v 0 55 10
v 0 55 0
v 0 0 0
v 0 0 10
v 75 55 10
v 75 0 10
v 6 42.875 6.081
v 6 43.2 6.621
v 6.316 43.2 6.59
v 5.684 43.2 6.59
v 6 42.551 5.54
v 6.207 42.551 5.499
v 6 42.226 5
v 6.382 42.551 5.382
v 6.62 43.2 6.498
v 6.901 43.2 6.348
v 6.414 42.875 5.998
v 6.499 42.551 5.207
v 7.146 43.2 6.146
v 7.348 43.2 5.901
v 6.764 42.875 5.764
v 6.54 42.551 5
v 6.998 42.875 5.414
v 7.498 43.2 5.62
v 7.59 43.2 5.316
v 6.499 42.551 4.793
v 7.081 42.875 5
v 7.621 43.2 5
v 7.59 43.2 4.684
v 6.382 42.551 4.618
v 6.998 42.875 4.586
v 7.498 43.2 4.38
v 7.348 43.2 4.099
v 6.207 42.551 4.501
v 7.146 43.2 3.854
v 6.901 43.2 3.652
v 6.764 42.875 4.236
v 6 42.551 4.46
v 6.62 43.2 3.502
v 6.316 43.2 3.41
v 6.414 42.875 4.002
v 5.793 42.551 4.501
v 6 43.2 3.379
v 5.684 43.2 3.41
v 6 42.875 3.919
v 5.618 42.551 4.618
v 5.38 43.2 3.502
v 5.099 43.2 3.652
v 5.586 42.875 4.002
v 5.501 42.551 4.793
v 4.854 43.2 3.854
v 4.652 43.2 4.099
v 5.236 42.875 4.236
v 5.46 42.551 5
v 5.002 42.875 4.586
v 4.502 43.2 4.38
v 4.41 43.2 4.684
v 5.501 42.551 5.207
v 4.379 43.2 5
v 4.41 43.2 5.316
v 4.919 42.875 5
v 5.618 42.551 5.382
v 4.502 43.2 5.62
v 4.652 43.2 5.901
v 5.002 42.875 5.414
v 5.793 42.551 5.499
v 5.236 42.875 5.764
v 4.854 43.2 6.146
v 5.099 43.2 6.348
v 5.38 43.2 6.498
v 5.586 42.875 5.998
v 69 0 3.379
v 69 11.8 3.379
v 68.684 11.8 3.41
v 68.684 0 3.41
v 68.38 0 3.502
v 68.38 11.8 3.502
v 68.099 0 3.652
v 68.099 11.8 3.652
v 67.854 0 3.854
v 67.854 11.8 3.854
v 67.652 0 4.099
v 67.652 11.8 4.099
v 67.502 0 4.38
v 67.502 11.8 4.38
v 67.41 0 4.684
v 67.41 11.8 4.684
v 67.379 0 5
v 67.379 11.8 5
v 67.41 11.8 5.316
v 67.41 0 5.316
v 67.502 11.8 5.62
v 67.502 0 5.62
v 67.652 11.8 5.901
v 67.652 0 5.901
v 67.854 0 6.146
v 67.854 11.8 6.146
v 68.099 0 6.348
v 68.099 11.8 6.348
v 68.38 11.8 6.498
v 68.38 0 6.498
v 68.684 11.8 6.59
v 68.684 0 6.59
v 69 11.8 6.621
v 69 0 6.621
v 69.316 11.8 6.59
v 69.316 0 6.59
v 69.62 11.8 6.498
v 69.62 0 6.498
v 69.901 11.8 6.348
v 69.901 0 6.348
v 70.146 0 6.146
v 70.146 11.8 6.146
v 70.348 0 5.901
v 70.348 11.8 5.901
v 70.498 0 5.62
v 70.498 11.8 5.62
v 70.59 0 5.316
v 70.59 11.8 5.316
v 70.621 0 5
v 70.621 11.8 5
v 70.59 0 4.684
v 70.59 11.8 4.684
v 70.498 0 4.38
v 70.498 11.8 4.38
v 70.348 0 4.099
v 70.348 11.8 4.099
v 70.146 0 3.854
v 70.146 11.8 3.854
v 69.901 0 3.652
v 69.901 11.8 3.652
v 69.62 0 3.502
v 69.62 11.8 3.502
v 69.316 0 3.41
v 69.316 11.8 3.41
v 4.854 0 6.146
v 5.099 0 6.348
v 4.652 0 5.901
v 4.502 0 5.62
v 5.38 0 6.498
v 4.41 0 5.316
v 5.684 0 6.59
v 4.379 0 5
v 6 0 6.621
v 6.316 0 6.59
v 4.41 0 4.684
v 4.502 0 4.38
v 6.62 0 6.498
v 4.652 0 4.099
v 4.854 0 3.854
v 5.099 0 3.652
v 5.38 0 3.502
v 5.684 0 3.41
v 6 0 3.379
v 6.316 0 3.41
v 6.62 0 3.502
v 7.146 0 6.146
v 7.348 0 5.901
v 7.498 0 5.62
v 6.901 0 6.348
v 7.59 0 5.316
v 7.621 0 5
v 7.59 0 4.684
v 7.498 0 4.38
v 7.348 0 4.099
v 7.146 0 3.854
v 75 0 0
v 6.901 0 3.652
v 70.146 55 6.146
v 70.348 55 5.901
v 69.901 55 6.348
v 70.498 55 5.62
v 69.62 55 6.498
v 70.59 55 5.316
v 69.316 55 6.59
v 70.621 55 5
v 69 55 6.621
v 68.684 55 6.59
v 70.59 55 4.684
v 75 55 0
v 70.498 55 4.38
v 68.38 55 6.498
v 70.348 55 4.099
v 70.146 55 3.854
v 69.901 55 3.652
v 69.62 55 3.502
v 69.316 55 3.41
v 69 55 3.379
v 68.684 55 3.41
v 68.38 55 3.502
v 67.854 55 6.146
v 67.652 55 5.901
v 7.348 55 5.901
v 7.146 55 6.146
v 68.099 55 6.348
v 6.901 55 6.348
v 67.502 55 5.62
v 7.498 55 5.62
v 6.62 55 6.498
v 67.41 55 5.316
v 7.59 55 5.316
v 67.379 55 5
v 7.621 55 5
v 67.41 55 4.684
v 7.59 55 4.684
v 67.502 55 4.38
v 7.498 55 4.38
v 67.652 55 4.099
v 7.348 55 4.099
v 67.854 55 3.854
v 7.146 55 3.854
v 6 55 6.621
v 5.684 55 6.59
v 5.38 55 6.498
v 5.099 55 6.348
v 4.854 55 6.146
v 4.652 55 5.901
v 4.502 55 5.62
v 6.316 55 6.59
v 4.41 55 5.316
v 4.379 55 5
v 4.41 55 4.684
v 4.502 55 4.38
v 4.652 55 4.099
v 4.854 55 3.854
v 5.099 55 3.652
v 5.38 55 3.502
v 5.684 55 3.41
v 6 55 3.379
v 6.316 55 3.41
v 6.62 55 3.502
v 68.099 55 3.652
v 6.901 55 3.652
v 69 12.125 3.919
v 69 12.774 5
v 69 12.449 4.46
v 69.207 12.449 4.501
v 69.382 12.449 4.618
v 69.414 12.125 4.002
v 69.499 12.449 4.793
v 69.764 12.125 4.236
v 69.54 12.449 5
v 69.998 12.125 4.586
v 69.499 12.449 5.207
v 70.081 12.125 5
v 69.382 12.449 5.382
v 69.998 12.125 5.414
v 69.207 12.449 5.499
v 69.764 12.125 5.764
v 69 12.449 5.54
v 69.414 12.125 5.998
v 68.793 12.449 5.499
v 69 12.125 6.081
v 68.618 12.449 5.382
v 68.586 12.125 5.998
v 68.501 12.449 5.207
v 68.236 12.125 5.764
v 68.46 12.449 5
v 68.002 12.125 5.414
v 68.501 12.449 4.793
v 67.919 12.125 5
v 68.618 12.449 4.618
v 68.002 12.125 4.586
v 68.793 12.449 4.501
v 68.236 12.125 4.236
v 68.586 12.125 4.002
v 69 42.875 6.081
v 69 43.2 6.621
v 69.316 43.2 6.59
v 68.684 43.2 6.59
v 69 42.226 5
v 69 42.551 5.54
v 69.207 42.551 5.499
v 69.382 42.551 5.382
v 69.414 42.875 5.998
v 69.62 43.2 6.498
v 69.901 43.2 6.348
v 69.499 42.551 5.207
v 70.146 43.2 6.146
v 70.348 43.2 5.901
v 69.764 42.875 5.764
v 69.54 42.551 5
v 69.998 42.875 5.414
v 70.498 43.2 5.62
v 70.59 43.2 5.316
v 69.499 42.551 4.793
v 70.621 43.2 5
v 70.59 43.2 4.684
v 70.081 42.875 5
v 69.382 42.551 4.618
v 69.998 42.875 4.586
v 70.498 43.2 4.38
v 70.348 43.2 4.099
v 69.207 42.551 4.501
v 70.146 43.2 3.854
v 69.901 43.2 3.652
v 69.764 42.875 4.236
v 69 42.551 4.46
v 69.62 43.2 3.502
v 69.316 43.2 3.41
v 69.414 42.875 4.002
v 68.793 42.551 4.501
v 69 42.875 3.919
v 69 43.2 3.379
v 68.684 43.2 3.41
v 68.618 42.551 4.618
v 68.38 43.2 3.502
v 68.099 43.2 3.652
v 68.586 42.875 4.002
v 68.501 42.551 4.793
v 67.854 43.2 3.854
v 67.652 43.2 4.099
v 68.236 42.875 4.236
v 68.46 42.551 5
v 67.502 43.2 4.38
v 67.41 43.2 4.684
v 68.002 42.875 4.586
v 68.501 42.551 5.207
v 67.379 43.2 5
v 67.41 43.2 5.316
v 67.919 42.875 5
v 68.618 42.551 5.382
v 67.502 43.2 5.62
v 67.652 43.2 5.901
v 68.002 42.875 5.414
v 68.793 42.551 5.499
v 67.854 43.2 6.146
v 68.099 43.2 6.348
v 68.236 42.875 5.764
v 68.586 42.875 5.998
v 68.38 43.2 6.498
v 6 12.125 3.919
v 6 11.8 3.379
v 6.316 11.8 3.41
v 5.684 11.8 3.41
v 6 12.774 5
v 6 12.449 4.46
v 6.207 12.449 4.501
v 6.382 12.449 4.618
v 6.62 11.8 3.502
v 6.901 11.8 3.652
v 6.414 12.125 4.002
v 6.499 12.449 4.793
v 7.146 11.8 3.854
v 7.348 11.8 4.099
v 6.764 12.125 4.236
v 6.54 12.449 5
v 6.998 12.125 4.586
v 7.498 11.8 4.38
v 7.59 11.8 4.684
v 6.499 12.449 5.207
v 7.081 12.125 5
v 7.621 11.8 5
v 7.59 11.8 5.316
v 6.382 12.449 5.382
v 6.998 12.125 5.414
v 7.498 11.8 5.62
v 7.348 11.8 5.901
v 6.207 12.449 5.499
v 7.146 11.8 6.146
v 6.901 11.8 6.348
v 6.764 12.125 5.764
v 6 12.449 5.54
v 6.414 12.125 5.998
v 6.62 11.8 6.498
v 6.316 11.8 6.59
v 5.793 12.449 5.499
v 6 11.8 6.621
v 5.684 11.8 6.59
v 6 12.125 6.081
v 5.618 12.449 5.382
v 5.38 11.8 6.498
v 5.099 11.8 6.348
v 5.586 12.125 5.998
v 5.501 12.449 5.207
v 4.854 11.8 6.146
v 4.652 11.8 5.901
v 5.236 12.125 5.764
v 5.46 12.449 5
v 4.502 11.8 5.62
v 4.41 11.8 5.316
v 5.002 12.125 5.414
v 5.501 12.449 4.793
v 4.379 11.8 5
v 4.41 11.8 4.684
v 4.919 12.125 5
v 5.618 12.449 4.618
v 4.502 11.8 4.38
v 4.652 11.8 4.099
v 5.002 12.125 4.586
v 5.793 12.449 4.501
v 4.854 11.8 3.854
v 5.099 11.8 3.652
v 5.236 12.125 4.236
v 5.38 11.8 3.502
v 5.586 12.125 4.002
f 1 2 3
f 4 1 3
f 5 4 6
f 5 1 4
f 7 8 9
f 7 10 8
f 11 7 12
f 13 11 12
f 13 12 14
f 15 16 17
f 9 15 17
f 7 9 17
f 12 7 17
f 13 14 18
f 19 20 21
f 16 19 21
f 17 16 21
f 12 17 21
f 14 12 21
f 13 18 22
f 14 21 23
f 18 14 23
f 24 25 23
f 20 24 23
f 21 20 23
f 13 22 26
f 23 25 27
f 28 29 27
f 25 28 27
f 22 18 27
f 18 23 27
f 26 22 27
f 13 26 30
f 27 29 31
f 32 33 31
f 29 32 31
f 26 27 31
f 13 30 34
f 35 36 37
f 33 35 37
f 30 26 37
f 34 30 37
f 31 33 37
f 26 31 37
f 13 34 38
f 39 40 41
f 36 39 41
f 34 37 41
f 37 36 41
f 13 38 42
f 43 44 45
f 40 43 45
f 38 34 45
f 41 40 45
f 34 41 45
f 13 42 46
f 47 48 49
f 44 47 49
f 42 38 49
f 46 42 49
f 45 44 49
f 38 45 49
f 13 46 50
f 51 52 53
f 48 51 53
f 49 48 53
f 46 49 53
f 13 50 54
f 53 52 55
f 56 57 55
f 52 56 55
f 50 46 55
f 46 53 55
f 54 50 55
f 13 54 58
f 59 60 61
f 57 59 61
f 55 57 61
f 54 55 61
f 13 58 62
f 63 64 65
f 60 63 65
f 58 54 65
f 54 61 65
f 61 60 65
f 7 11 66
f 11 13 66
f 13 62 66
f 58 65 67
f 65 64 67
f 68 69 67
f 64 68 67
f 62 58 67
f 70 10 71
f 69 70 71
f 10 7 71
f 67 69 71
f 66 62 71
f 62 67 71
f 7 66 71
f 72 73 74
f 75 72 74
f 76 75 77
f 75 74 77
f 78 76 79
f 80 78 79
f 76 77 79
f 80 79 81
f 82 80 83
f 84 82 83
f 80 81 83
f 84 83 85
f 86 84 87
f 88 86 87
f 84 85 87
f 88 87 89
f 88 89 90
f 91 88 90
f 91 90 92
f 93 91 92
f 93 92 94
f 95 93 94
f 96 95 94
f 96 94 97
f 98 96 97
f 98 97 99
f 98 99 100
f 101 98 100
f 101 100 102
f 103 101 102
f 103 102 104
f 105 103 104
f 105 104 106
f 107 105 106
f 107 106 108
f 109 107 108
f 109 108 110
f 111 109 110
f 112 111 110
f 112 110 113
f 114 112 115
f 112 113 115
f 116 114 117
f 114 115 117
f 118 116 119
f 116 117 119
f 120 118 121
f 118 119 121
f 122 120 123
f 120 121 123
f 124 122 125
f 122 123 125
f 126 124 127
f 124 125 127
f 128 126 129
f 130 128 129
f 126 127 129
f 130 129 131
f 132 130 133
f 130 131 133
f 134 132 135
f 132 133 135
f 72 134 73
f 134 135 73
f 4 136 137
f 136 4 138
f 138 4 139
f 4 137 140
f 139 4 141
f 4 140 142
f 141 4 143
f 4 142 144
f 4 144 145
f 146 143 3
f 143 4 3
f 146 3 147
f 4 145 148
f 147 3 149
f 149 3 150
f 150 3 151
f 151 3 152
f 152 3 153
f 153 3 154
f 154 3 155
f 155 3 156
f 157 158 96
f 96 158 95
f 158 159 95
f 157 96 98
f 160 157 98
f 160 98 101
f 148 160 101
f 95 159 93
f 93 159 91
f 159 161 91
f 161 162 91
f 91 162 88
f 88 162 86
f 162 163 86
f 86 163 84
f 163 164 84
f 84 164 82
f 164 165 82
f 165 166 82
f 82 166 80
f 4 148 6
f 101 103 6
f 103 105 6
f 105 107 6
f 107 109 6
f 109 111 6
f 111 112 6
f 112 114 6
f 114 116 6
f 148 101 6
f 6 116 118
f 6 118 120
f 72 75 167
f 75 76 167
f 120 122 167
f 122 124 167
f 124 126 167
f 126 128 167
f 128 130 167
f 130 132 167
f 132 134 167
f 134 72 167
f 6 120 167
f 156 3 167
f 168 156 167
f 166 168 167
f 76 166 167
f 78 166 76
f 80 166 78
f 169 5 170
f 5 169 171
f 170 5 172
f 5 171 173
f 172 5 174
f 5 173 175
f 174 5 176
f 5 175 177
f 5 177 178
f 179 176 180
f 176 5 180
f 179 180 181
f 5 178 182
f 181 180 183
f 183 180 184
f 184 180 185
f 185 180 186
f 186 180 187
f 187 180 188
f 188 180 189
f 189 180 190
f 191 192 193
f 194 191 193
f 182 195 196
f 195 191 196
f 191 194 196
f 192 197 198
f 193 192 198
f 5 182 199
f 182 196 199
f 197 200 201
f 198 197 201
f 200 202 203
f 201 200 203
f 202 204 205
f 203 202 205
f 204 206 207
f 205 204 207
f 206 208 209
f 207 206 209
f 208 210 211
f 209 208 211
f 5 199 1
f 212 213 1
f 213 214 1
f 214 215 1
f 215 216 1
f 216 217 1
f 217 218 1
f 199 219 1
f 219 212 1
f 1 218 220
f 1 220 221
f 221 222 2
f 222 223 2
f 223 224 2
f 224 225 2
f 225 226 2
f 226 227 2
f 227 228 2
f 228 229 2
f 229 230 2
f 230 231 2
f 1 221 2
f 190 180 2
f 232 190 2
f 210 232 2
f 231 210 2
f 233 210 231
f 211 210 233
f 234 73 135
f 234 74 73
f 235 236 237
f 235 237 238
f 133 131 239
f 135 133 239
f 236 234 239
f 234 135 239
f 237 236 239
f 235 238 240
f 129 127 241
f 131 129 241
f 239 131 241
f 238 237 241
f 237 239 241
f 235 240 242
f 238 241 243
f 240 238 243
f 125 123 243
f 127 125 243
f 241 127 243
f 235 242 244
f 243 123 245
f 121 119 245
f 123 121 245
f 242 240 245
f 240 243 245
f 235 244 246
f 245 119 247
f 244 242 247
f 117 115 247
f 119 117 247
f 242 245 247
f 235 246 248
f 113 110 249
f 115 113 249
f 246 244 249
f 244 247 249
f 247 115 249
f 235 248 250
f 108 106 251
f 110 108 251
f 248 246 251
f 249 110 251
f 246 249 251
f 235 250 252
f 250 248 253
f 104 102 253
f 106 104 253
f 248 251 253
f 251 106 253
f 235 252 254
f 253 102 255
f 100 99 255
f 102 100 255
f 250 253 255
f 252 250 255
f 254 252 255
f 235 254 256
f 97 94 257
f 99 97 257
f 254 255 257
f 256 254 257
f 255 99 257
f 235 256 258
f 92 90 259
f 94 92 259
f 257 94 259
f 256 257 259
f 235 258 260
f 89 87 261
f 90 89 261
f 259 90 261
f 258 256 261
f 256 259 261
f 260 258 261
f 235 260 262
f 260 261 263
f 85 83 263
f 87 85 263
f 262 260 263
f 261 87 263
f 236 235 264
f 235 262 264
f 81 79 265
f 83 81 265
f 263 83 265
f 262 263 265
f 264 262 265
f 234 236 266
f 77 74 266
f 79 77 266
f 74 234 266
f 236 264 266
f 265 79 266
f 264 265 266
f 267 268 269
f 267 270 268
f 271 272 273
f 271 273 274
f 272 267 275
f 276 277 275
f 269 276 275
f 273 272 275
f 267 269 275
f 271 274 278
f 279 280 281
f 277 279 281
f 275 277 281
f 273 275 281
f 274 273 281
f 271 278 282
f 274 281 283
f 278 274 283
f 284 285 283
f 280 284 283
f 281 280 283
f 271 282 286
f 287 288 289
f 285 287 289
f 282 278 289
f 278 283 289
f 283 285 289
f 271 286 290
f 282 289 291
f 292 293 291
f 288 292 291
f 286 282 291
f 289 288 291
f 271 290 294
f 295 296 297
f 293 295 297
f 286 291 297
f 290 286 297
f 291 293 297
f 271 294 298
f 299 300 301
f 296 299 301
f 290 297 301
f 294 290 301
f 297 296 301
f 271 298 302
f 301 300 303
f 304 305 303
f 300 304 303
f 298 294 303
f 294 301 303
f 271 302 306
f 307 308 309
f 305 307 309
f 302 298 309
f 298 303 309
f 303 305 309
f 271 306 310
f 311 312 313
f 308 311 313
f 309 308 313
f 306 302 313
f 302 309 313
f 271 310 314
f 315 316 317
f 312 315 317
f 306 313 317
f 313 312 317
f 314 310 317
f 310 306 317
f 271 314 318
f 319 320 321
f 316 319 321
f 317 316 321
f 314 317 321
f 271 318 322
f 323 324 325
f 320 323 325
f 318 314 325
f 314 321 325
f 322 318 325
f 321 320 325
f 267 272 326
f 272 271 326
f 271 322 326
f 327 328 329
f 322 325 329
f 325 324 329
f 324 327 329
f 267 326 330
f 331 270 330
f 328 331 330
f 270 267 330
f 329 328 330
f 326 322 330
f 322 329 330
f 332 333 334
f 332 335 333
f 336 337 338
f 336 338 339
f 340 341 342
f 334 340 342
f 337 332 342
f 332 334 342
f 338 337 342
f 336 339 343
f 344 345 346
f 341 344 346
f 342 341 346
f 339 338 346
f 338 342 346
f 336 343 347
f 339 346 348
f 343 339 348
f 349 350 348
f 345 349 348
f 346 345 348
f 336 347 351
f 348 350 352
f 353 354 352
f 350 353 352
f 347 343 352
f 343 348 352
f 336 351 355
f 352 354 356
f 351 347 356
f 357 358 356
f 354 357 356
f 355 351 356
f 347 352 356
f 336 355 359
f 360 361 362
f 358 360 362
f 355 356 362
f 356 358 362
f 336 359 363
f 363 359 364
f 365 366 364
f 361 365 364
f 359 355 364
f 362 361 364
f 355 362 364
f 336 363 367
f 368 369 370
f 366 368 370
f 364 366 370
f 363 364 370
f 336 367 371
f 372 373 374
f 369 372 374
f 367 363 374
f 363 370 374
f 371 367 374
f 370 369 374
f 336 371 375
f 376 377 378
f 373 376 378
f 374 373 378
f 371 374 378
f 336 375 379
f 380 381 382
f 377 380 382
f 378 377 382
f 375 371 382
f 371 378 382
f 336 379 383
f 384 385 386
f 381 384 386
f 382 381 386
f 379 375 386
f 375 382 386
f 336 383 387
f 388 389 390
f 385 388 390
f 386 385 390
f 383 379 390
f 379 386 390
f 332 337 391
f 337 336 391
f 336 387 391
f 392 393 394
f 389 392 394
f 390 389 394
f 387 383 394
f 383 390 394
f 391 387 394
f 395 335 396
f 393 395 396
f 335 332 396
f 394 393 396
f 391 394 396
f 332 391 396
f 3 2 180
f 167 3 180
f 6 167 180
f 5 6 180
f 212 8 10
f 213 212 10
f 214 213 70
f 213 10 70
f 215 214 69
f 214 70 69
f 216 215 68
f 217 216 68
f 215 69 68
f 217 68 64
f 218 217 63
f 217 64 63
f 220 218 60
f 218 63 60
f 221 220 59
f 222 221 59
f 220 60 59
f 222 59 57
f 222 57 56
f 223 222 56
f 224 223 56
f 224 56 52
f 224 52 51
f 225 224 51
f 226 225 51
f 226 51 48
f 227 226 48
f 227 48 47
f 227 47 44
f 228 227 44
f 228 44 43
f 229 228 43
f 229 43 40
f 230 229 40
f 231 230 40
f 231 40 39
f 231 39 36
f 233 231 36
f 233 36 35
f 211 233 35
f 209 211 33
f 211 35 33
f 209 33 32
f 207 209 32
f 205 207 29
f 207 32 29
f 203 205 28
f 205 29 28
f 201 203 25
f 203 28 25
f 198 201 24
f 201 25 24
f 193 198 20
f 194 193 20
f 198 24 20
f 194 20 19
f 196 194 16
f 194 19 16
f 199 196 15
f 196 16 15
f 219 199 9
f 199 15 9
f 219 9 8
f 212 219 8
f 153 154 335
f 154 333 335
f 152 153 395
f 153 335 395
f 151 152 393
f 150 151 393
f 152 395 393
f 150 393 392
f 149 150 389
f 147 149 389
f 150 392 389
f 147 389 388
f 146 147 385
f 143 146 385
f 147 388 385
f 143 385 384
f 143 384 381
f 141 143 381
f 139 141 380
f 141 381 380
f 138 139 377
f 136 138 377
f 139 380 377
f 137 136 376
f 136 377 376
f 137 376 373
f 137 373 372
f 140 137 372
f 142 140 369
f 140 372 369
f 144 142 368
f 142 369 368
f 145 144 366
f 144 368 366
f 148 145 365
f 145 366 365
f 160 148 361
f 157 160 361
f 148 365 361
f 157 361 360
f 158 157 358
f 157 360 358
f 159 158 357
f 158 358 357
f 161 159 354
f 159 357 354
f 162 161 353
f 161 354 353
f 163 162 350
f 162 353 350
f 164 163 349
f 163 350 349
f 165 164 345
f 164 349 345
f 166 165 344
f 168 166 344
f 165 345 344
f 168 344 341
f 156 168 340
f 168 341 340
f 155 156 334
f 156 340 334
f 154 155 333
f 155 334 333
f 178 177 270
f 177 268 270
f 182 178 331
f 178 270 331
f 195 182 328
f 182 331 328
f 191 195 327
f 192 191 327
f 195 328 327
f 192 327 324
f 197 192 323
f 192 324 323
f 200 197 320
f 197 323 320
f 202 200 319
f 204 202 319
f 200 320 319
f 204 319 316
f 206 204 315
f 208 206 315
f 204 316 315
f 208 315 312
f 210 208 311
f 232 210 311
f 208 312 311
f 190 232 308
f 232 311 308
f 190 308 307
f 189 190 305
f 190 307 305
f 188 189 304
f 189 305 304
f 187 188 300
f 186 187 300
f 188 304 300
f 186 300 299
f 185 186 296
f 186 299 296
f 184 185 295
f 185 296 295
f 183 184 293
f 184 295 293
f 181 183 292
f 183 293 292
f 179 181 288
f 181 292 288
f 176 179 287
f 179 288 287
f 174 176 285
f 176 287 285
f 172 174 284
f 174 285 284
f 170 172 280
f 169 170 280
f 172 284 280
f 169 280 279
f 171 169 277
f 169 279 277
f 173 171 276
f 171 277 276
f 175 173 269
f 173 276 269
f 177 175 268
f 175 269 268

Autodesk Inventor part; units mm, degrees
ref_plane "YZ Plane" through (0, 0, 0) normal (1, 0, 0) x (0, 1, 0)
ref_plane "XZ Plane" through (0, 0, 0) normal (0, 1, 0) x (-1, 0, 0)
ref_plane "XY Plane" through (0, 0, 0) normal (0, 0, 1) x (1, 0, 0)
sketch "Sketch1" plane through (0, 0, 0) normal (0, 0, 1) x (1, 0, 0)
  line L0 (0, 0) -> (75, 0)
  line L1 (75, 0) -> (75, 55)
  line L2 (75, 55) -> (0, 55)
  line L3 (0, 55) -> (0, 0)
  dimension "d0" = 55
  dimension "d1" = 75
extrude "Extrusion1" add sketch "Sketch1" along normal blind 10
sketch "Sketch3" plane through (0, 0, 0) normal (0, -1, 0) x (1, 0, 0)
  line L0 (0, 0) -> (0, 10) projected
  line L1 (0, 0) -> (75, 0) projected
  line L2 (75, 0) -> (75, 10) projected
  point P0 (6, 5)
  point P1 (69, 5)
  dimension "d14" = 6
  dimension "d15" = 6
  dimension "d16" = 5
hole "Hole2" at (6, 0, 5) at (69, 0, 5) direction (0, 1, 0) diameter 3.242 depth 11.8 tip angle 118 thread size "M4x0.7" class "6H" standard "ANSI Metric M Profile"
sketch "Sketch4" plane through (0, 55, 0) normal (0, 1, 0) x (1, 0, 0)
  line L0 (75, 0) -> (75, -10) projected
  line L1 (75, 0) -> (0, 0) projected
  line L2 (0, 0) -> (0, -10) projected
  point P0 (6, -5)
  point P1 (69, -5)
  dimension "d24" = 5
  dimension "d25" = 6
  dimension "d26" = 6
hole "Hole3" at (6, 55, 5) at (69, 55, 5) direction (0, -1, 0) diameter 3.242 depth 11.8 tip angle 118 thread size "M4x0.7" class "6H" standard "ANSI Metric M Profile"
equation "\"d26\" = d25"
properties part number "Sides" material "Aluminum-6061"
